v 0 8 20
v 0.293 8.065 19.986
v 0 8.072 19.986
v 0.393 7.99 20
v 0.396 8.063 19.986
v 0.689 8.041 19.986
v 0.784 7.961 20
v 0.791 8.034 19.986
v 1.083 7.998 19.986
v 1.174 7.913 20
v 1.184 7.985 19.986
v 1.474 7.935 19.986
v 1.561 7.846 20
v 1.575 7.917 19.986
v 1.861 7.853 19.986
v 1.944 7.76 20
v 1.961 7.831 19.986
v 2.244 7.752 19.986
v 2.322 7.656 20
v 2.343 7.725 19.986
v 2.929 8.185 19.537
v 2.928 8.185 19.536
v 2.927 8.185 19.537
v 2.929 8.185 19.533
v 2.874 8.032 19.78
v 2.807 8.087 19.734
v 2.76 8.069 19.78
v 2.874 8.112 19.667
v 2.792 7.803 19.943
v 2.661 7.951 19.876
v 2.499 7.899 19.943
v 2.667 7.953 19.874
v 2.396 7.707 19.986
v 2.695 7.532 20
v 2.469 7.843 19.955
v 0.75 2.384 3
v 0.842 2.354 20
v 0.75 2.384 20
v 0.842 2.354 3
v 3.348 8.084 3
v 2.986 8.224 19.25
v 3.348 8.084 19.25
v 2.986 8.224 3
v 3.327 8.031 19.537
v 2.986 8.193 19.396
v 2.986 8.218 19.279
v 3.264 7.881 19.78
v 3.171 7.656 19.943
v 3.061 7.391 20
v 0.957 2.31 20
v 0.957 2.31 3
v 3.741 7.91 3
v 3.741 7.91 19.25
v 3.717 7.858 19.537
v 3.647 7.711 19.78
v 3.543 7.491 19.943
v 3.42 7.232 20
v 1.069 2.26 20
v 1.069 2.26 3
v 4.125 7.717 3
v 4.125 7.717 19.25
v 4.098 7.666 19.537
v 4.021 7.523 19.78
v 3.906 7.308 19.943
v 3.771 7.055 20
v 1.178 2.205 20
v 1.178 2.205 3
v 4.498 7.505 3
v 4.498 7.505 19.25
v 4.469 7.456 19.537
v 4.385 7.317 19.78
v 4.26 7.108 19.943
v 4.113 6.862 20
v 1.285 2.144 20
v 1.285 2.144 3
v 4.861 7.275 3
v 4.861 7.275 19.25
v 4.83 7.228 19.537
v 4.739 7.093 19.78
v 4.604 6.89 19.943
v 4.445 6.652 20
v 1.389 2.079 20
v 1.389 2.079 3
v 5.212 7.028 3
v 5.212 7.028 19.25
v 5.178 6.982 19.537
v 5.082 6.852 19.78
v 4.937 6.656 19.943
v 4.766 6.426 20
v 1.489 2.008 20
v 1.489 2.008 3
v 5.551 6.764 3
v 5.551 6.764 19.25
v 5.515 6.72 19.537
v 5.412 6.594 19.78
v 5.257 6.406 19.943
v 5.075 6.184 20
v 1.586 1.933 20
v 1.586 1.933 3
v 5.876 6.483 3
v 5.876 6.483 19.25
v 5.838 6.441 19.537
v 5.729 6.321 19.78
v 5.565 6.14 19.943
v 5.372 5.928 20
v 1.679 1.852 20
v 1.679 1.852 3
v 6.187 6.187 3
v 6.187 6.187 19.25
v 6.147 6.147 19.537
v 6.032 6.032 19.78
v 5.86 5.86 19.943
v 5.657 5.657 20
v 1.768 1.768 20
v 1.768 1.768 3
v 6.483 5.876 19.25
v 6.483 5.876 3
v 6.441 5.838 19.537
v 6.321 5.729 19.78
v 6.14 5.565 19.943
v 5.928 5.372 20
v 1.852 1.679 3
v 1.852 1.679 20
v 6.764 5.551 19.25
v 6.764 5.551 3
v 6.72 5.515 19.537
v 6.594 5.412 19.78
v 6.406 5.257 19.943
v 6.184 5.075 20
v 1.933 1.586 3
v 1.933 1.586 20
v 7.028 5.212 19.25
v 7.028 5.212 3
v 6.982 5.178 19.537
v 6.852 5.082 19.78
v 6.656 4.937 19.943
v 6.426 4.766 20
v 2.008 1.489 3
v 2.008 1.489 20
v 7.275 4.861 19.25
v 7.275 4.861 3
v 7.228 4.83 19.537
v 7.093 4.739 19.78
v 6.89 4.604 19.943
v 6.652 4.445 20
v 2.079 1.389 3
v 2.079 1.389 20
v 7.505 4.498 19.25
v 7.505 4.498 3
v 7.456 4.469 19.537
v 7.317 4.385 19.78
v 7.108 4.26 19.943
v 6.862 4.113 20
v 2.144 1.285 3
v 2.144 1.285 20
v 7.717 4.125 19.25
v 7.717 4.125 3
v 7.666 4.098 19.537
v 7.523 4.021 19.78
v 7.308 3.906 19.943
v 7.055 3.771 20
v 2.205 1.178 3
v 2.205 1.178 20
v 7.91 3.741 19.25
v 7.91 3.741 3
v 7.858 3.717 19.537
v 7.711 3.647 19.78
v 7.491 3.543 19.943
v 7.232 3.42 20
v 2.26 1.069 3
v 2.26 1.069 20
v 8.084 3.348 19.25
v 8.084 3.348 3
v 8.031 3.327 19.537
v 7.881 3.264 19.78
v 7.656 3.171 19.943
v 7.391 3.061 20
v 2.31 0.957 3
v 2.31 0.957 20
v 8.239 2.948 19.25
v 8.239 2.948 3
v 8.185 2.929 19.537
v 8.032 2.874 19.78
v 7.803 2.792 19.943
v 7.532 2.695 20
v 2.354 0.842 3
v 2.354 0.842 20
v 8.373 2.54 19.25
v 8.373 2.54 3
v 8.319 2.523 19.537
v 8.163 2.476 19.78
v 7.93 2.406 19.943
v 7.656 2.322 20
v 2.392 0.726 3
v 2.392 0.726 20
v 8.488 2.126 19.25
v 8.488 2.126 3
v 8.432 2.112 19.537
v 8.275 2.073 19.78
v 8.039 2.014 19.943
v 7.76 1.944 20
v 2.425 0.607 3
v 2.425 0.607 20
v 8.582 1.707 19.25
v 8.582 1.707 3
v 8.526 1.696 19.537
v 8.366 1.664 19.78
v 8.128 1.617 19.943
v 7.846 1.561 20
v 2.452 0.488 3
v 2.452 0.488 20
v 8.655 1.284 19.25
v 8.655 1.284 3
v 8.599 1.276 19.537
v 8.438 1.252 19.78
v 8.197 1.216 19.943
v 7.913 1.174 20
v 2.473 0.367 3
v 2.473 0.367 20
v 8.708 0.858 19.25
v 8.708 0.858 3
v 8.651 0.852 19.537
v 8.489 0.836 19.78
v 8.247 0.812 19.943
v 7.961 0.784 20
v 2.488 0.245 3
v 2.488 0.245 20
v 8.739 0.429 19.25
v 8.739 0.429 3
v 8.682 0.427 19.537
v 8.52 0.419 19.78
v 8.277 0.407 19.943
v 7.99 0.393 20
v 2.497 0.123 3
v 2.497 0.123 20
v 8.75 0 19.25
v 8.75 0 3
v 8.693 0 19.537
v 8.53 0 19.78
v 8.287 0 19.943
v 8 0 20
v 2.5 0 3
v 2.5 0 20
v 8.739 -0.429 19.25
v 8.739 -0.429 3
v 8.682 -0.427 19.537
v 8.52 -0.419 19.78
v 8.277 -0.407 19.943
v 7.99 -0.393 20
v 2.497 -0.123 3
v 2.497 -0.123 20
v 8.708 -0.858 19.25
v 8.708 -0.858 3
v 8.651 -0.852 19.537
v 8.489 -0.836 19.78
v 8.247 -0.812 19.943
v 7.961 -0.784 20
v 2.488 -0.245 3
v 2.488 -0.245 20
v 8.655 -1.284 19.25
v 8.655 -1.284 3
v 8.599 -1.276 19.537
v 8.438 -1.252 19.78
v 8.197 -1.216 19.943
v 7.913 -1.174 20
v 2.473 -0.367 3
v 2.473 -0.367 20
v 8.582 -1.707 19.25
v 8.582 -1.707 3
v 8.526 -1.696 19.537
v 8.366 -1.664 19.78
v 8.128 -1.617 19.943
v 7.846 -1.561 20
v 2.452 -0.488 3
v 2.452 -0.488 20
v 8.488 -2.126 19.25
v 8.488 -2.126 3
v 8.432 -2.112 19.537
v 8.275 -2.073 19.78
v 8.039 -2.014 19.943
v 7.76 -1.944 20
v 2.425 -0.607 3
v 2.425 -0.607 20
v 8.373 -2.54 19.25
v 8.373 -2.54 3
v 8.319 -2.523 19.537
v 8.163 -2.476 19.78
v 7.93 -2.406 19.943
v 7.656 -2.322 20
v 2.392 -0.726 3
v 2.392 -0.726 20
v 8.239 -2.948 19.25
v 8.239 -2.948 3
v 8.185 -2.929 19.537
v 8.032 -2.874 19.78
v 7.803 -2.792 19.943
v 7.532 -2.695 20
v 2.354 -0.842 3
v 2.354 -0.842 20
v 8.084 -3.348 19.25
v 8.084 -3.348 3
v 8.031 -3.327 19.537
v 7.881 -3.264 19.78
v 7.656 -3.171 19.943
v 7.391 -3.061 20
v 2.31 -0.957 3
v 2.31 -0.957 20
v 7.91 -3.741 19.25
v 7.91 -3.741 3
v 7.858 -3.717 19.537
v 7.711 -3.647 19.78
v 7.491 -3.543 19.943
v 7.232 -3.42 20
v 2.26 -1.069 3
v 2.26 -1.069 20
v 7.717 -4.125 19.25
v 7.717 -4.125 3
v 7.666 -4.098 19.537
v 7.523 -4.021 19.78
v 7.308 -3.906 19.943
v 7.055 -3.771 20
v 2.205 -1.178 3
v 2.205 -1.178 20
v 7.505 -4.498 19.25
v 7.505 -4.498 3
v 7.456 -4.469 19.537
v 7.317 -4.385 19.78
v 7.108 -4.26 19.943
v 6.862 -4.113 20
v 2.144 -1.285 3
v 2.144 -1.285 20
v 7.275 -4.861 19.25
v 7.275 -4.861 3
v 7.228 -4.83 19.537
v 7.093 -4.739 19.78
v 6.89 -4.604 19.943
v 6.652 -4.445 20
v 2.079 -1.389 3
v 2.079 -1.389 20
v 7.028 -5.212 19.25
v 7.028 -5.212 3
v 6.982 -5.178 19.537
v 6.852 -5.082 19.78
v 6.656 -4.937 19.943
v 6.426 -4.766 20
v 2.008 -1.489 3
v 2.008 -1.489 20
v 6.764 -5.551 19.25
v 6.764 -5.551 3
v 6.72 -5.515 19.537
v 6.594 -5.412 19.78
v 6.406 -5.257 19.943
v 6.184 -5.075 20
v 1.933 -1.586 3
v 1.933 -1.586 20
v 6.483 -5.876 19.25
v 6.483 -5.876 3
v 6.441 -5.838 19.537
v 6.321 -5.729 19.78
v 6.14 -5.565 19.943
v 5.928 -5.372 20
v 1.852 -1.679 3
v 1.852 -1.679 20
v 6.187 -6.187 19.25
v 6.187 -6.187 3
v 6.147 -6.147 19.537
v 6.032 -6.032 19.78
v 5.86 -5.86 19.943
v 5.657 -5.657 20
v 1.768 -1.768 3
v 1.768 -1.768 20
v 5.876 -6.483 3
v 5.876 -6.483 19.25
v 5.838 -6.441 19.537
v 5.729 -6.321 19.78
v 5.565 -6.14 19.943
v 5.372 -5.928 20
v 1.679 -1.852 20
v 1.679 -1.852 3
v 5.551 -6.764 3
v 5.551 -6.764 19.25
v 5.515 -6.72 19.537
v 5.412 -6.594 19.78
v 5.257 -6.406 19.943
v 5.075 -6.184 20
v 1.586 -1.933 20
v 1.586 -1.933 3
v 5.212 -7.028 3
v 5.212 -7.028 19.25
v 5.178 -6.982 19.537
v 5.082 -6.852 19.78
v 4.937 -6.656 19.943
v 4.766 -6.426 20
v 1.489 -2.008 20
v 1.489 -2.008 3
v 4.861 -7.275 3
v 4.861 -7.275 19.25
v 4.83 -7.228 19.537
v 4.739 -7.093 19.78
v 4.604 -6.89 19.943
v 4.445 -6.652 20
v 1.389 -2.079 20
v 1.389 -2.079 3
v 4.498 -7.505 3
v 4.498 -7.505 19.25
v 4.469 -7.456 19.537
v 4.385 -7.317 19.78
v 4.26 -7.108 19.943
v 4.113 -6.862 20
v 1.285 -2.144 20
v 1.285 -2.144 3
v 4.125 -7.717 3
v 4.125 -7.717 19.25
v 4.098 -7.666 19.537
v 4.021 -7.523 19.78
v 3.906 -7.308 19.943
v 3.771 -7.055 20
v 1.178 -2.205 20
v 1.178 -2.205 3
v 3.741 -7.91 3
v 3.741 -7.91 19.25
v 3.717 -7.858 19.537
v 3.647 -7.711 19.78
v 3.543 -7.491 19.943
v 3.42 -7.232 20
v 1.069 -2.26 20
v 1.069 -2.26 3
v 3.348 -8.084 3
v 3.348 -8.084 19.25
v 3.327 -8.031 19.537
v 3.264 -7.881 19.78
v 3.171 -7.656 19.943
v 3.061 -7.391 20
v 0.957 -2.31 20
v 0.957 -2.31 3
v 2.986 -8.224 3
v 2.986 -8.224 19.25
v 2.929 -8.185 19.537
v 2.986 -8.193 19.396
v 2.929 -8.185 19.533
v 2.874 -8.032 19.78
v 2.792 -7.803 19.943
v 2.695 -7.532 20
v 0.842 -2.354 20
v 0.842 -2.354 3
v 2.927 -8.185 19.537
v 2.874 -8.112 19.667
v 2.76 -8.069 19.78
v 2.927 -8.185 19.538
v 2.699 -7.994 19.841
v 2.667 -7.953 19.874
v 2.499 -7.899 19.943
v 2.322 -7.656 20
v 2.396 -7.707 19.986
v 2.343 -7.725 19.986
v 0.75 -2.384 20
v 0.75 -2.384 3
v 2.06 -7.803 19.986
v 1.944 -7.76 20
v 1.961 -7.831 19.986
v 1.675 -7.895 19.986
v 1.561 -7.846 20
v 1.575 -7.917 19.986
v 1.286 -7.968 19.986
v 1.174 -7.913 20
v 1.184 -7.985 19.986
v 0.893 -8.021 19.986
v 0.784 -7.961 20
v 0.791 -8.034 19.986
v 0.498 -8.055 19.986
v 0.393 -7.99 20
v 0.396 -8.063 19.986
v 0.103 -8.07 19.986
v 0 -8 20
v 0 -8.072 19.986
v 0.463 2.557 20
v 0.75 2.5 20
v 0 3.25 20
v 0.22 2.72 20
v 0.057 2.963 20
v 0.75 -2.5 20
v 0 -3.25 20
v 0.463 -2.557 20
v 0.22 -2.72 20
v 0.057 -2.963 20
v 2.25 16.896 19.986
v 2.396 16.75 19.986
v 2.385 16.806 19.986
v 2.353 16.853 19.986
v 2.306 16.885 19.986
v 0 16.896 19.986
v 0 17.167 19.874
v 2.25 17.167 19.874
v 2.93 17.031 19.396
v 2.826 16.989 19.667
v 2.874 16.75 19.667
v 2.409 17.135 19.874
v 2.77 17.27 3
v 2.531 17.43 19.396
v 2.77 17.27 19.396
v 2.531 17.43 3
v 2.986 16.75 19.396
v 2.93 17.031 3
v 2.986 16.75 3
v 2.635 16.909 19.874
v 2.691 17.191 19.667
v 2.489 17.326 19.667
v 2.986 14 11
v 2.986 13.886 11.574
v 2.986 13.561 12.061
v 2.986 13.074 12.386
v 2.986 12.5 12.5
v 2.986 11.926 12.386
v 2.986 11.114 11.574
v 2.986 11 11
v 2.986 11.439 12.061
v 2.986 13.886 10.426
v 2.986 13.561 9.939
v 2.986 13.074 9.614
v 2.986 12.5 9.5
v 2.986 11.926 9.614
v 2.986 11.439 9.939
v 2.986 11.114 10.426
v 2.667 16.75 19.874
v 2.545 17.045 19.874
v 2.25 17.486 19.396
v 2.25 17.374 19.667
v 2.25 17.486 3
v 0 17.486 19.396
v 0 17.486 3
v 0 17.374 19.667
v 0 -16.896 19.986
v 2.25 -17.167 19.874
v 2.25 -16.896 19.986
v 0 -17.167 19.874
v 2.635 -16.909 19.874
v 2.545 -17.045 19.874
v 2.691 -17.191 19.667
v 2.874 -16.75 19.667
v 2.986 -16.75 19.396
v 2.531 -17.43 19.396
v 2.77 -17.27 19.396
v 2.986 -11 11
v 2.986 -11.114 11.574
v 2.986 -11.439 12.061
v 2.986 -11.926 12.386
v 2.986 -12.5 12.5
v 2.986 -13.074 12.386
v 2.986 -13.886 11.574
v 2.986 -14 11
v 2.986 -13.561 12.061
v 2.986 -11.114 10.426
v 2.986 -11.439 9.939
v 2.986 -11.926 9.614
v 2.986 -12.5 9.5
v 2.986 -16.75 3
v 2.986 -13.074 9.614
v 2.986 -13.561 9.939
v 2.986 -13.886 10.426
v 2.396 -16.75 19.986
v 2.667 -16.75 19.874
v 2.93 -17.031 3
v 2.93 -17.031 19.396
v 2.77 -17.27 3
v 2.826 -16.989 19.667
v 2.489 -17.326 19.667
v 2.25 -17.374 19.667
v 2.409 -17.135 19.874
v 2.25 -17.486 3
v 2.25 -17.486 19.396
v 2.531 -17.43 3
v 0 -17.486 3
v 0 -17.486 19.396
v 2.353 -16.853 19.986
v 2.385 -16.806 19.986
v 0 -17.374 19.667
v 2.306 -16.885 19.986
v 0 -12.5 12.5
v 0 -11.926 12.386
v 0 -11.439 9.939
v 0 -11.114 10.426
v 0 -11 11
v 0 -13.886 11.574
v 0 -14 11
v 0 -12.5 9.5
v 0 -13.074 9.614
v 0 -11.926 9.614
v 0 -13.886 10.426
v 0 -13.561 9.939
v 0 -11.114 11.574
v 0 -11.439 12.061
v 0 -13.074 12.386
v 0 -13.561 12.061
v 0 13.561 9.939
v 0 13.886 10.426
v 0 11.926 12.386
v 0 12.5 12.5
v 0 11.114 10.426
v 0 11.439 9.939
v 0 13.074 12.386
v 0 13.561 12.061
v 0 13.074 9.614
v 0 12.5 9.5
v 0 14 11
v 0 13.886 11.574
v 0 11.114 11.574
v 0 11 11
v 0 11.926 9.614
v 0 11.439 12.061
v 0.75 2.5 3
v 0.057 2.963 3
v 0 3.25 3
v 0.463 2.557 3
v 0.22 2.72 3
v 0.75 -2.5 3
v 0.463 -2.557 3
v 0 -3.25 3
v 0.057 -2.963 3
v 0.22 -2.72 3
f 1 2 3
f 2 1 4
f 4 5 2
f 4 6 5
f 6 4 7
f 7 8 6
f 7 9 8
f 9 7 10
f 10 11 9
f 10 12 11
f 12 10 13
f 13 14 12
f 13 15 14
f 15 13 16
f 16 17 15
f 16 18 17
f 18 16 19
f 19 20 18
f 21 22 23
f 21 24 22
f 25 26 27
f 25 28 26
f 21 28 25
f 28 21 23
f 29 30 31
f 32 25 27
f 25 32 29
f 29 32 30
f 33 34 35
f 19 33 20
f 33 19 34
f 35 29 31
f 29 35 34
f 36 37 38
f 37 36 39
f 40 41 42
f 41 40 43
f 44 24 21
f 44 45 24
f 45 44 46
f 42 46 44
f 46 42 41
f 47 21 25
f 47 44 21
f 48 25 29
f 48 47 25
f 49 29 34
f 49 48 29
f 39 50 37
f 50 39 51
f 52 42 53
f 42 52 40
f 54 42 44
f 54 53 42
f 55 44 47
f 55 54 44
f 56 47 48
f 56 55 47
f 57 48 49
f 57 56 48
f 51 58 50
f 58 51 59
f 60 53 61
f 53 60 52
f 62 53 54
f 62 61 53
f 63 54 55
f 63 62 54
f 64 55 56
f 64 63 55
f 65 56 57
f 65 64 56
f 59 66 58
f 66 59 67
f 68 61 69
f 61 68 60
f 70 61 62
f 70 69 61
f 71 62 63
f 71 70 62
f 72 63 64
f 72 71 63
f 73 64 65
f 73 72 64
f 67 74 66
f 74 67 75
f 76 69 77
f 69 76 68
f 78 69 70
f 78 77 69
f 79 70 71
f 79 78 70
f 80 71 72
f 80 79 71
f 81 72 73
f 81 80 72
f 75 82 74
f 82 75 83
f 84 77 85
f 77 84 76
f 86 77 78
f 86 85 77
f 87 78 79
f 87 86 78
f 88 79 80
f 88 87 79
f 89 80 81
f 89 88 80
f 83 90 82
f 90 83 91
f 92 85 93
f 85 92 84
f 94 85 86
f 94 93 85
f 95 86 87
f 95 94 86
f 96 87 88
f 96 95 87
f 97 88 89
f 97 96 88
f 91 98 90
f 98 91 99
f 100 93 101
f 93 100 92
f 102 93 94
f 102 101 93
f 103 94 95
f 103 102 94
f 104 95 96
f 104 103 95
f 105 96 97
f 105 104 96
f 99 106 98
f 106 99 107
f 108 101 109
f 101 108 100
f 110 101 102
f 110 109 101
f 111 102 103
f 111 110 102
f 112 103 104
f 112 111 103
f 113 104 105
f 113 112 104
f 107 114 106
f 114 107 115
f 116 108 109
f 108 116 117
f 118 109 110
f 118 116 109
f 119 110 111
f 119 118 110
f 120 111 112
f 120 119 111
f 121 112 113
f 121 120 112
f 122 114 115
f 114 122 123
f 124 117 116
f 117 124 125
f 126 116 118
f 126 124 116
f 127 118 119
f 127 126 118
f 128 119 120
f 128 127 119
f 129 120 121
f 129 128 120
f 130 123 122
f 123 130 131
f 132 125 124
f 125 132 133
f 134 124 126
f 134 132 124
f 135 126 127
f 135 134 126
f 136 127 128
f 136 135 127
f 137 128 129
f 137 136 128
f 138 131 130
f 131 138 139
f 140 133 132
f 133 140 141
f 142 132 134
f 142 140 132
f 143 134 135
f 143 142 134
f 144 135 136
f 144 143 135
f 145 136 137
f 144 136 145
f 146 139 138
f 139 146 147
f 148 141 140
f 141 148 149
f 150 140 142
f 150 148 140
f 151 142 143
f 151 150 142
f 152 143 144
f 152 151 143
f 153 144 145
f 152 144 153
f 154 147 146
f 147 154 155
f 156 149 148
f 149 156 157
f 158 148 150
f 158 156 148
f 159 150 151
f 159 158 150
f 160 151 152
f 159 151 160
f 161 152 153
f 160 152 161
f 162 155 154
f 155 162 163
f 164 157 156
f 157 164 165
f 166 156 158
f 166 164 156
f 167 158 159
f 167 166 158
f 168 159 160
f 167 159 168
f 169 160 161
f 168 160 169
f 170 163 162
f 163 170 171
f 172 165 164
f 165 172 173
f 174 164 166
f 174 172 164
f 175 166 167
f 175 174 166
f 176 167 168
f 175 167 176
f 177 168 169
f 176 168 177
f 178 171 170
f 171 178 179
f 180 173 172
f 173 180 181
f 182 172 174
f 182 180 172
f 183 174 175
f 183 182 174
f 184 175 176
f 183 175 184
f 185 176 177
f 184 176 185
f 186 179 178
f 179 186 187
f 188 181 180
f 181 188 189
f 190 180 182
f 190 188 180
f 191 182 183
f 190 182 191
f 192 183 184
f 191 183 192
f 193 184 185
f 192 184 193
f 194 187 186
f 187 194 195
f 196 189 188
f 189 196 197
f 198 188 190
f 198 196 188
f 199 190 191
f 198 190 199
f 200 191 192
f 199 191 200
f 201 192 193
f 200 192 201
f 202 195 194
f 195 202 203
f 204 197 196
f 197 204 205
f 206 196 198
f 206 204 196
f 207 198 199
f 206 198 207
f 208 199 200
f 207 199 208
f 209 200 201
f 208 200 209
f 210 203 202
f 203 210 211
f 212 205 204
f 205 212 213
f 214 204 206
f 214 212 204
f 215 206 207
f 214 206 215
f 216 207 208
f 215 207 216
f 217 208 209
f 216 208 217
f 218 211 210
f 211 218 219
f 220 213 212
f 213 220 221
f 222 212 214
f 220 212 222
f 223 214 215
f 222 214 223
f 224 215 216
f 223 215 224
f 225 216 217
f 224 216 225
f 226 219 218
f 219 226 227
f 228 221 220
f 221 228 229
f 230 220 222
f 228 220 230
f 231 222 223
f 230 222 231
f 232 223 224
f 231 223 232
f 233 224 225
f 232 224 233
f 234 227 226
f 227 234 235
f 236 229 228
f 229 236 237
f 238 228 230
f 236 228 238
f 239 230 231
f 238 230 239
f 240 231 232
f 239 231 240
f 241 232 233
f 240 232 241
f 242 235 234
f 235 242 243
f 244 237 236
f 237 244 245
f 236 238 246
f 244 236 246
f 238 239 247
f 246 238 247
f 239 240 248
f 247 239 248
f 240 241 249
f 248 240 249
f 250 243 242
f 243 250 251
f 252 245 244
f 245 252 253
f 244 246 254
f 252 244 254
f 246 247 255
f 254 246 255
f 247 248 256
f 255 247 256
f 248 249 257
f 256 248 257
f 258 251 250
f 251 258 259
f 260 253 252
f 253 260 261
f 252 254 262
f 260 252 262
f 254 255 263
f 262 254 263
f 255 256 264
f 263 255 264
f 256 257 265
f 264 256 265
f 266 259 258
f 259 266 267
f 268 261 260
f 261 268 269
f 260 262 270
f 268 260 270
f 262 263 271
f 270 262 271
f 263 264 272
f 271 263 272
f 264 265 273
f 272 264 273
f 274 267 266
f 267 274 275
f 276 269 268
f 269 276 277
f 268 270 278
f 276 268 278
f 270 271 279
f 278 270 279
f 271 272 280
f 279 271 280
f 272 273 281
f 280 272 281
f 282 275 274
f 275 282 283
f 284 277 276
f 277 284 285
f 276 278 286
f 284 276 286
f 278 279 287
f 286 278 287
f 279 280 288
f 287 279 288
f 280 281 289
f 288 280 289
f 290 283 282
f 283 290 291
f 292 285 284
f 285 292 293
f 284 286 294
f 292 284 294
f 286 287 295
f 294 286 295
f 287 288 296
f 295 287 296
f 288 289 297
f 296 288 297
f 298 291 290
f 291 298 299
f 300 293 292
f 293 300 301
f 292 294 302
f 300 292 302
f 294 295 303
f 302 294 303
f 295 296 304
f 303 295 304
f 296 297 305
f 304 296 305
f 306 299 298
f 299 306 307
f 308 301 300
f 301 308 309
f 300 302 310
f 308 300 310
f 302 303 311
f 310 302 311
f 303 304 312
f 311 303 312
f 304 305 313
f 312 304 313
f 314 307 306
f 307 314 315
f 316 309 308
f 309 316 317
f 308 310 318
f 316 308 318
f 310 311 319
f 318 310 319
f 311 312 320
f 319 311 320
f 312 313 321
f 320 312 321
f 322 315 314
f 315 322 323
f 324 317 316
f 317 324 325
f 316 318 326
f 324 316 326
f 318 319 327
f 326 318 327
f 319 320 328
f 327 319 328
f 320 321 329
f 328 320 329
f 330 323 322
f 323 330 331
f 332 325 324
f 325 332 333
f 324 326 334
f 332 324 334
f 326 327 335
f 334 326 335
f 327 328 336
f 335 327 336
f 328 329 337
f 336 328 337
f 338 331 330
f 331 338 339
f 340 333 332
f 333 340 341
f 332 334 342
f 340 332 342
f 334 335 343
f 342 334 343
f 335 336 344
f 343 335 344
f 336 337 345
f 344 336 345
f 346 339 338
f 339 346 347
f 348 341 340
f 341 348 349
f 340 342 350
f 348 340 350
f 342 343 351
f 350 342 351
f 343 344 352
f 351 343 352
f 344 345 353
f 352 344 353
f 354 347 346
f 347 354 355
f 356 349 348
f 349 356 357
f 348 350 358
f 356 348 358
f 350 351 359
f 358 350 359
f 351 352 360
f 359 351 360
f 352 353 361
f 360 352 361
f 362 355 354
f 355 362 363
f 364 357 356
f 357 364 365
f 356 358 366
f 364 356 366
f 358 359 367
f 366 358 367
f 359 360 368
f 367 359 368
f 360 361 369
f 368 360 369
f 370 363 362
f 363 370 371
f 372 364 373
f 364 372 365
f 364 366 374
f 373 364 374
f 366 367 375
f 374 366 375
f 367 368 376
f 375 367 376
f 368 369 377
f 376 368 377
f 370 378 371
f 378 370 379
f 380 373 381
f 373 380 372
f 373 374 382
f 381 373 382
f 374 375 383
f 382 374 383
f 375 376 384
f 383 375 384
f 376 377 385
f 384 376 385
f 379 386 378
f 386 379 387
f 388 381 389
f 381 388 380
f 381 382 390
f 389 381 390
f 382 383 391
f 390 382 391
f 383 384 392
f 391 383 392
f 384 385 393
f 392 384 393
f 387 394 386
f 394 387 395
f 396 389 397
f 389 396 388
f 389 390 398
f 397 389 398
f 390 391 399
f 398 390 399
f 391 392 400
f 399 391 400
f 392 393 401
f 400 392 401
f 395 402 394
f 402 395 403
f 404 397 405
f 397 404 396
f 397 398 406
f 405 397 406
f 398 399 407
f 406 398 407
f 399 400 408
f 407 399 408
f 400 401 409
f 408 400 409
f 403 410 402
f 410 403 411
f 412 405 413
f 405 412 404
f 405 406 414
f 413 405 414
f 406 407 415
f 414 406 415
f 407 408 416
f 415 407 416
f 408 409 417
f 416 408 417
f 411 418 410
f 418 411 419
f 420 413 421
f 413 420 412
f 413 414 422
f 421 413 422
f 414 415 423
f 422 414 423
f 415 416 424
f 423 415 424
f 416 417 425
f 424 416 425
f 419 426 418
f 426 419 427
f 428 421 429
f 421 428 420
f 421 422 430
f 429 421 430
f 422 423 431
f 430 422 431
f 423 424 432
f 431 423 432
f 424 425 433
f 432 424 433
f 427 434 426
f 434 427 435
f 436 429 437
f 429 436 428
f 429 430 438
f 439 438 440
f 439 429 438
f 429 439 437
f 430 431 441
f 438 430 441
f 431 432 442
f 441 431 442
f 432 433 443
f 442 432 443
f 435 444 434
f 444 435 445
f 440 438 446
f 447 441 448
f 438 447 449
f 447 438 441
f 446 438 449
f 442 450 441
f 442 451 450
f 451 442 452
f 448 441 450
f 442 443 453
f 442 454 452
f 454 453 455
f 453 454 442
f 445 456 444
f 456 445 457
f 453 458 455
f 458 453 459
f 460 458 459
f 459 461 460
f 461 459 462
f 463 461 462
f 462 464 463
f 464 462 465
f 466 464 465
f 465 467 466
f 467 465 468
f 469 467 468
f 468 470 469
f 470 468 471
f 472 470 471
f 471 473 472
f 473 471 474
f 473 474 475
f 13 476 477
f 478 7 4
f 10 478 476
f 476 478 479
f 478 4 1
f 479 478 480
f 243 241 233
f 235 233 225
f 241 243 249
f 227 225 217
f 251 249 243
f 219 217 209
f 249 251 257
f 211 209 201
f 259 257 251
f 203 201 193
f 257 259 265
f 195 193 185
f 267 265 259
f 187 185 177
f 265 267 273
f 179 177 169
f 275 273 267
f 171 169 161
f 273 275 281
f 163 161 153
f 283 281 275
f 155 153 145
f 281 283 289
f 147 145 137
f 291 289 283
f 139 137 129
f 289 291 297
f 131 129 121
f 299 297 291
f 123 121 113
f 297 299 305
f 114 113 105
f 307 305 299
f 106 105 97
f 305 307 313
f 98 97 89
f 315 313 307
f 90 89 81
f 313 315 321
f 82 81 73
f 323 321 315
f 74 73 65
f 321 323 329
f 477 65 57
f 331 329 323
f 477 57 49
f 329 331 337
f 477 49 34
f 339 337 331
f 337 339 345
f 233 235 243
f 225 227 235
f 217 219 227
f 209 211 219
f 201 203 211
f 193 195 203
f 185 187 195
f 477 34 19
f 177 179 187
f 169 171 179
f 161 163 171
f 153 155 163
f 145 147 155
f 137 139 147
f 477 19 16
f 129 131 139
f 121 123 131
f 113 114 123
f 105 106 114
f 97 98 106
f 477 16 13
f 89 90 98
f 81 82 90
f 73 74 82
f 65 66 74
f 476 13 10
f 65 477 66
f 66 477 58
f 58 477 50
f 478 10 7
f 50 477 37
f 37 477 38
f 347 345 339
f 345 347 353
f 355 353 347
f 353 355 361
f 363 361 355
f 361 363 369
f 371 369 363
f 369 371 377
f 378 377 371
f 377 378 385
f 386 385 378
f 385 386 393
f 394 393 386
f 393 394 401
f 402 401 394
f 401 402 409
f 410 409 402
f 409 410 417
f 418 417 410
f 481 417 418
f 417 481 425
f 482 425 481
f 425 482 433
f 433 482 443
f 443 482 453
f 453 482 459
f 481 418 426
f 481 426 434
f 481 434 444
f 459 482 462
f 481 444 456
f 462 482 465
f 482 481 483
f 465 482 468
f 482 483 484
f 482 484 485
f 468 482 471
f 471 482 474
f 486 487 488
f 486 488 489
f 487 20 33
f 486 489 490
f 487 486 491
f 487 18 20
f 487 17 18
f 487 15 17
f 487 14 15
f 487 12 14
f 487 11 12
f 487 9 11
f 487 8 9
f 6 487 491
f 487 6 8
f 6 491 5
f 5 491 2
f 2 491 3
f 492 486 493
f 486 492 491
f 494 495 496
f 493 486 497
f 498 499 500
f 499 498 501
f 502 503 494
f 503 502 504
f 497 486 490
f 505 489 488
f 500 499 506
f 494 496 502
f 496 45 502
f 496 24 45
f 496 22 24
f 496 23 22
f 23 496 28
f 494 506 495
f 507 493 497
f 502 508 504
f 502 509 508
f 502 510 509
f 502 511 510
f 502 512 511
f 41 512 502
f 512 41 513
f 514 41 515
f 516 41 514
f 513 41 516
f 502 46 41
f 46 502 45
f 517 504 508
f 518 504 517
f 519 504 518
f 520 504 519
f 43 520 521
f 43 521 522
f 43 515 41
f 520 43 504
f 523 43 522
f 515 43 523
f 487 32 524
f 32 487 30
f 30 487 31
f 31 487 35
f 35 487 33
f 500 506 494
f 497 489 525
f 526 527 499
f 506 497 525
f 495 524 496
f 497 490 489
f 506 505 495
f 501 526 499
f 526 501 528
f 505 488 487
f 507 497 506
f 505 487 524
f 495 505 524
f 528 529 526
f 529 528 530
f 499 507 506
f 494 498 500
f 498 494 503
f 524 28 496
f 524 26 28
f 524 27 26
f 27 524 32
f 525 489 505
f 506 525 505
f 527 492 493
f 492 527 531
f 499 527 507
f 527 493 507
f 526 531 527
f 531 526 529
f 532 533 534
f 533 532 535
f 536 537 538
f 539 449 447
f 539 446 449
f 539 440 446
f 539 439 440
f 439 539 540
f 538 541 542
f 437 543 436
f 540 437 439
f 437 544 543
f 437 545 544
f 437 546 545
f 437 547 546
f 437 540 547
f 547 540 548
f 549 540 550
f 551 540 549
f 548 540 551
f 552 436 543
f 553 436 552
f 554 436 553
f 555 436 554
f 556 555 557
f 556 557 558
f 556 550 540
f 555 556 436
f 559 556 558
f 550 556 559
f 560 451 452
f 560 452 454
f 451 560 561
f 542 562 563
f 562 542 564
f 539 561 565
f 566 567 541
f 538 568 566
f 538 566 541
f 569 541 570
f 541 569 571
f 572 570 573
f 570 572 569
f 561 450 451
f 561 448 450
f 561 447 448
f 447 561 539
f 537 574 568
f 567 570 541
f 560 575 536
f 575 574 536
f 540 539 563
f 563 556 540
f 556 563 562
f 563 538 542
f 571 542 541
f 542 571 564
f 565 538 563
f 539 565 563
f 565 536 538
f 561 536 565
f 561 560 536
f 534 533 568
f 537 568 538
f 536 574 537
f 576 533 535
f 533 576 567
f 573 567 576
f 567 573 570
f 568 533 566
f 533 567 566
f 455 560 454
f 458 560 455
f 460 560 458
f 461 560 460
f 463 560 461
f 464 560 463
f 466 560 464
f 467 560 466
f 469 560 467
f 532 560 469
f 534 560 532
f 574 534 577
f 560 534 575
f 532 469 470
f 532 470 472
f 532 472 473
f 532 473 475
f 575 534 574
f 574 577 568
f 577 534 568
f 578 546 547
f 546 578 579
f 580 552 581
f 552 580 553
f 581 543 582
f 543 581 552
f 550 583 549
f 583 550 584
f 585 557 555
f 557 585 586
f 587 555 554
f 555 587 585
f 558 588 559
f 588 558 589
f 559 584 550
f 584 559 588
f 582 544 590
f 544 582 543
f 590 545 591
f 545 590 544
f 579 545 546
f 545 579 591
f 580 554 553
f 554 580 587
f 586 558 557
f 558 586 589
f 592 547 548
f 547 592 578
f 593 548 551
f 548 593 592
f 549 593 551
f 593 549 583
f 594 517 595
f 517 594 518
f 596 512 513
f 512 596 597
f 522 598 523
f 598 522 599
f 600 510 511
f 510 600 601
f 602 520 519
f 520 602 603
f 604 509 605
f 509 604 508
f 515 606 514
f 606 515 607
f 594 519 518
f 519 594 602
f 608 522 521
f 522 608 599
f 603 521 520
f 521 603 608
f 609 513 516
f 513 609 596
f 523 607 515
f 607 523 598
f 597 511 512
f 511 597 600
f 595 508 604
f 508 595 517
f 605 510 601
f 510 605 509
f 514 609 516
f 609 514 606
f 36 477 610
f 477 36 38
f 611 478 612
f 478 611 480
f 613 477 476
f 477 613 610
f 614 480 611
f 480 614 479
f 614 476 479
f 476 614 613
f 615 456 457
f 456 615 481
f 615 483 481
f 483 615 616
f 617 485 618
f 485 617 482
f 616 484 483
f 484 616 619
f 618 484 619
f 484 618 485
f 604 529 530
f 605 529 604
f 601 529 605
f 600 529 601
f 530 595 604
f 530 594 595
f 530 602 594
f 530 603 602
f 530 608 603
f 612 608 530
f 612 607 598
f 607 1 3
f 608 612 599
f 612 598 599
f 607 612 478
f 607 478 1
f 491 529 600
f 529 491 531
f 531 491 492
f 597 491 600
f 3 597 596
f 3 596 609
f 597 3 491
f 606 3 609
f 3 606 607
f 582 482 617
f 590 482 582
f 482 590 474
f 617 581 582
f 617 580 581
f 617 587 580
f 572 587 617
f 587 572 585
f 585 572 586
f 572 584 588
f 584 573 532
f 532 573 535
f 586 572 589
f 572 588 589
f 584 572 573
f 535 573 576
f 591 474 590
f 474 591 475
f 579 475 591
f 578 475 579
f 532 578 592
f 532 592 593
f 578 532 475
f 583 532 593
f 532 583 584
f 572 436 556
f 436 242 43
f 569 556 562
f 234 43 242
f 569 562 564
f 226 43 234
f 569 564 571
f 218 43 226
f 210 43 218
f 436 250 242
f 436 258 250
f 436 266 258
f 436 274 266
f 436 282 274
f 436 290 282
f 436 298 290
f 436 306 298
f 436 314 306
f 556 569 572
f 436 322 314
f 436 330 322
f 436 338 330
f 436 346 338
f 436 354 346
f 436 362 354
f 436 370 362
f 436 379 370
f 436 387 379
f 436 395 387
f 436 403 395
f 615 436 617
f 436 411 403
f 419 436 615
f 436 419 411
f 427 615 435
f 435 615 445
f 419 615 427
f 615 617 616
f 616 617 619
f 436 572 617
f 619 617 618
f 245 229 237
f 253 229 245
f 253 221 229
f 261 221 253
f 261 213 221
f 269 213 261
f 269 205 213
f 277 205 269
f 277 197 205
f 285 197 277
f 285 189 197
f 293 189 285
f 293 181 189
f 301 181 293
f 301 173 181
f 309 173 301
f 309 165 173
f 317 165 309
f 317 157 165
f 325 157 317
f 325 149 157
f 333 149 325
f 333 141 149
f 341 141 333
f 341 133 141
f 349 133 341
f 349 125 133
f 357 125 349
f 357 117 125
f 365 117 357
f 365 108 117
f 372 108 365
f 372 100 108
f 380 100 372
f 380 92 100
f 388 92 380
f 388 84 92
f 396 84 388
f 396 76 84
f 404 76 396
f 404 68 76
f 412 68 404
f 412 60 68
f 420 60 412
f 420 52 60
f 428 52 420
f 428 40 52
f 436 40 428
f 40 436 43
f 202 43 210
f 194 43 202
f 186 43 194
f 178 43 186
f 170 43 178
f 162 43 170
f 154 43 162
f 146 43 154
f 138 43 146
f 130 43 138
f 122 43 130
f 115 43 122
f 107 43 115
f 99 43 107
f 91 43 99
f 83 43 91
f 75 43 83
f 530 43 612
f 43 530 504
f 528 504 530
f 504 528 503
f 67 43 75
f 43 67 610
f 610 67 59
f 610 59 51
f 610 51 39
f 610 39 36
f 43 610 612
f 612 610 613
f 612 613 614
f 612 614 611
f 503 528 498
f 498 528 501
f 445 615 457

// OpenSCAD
// file: clamplib.scad
holesize = 3;

module roundedBox(dim, r)
{
  hull() {
    for (z=[-0.5,0.5], y=[-0.5,0.5], x=[-0.5,0.5]) {
      translate([x*(dim.x-2*r), y*(dim.y-2*r), z*(dim.z-2*r)]) sphere(r);
    }
  }
}

module clampCylinder()
{
  rotate_extrude(convexity=2, $fn=128)
    translate([$inner_diameter/2 + $width/4,0]) {
        hull() {
          square([$width/2, $height], center=true);
          translate([$width-$roundingRadius,-$height/2+$roundingRadius]) circle($roundingRadius, $fn=$roundingDetail);
          translate([$width-$roundingRadius,$height/2-$roundingRadius]) circle($roundingRadius, $fn=$roundingDetail);
        }
    }
}

module doubleclamp() {
	hole_horiz_pos = $clamp_width+$width+$inner_diameter/2 - $clamp_width/2;
	
	module hole() {
	  rotate([0,90,0]) cylinder($fn=16, r=holesize/2, h=$clamp_thickness*2.5, center=true);
	}

	difference() {
            union() {
                clampCylinder($inner_diameter, $width);
	        translate([0, ($clamp_width+$width/2)/2 + $width/2 + $inner_diameter/2]) 
	          roundedBox([2*$clamp_thickness, $clamp_width+$width/2, $height], $roundingRadius, $fn=$roundingDetail);
	        translate([0, -($clamp_width+$width/2)/2 - $width/2 - $inner_diameter/2]) 
	          roundedBox([2*$clamp_thickness, $clamp_width+$width/2, $height], $roundingRadius, $fn=$roundingDetail);
            }

            for (h=hole_horiz_pos*[-1,1]) {
                for (i=[0:$holes-1], hole_vert_pos = -$height/2 + (i+0.5)*$height/$holes+1 ) {
    	            translate([0,h,hole_vert_pos]) hole();
                }
            }
	}
}

module innerProfile()
{
  difference() {
      cube([$roundingRadius*2, $roundingRadius*2, $height*1.2], center=true);
      translate([$roundingRadius, $roundingRadius, 0]) cylinder(h=$height*1.3, r=$roundingRadius, center=true, $fn=$roundingDetail);
  }
}

module clamp(inner_diameter, outer_diameter, clamp_width, clamp_thickness, height, holes) {
  $roundingRadius = clamp_thickness/4;
  $roundingDetail = 16;
  $inner_diameter = inner_diameter;
  $clamp_width = clamp_width;
  $clamp_thickness = clamp_thickness;
  $width = outer_diameter - inner_diameter;
  $height = height;
  $holes = holes;

  cubesize = 2.1*[inner_diameter+$width, inner_diameter+$width+clamp_width, height];
  difference() {
    doubleclamp(inner_diameter, $width, clamp_width, clamp_thickness);
    translate([-cubesize.x/2, 0, 0]) cube(cubesize, center=true);
    translate([0, inner_diameter/2, 0]) innerProfile();
    translate([0, -inner_diameter/2, 0]) rotate([0,0,-90]) innerProfile();
  }
}
// main file
use <clamplib.scad>

plate_thickness = 3;
fiber_hole_diam = 5;

difference() {
  translate([0,0,10]) clamp(inner_diameter=fiber_hole_diam,
        outer_diameter=fiber_hole_diam*2,
        clamp_width=10,
        clamp_thickness=3,
        height=20,
        holes=1);
   cube([100,100,6], center=true);
}
